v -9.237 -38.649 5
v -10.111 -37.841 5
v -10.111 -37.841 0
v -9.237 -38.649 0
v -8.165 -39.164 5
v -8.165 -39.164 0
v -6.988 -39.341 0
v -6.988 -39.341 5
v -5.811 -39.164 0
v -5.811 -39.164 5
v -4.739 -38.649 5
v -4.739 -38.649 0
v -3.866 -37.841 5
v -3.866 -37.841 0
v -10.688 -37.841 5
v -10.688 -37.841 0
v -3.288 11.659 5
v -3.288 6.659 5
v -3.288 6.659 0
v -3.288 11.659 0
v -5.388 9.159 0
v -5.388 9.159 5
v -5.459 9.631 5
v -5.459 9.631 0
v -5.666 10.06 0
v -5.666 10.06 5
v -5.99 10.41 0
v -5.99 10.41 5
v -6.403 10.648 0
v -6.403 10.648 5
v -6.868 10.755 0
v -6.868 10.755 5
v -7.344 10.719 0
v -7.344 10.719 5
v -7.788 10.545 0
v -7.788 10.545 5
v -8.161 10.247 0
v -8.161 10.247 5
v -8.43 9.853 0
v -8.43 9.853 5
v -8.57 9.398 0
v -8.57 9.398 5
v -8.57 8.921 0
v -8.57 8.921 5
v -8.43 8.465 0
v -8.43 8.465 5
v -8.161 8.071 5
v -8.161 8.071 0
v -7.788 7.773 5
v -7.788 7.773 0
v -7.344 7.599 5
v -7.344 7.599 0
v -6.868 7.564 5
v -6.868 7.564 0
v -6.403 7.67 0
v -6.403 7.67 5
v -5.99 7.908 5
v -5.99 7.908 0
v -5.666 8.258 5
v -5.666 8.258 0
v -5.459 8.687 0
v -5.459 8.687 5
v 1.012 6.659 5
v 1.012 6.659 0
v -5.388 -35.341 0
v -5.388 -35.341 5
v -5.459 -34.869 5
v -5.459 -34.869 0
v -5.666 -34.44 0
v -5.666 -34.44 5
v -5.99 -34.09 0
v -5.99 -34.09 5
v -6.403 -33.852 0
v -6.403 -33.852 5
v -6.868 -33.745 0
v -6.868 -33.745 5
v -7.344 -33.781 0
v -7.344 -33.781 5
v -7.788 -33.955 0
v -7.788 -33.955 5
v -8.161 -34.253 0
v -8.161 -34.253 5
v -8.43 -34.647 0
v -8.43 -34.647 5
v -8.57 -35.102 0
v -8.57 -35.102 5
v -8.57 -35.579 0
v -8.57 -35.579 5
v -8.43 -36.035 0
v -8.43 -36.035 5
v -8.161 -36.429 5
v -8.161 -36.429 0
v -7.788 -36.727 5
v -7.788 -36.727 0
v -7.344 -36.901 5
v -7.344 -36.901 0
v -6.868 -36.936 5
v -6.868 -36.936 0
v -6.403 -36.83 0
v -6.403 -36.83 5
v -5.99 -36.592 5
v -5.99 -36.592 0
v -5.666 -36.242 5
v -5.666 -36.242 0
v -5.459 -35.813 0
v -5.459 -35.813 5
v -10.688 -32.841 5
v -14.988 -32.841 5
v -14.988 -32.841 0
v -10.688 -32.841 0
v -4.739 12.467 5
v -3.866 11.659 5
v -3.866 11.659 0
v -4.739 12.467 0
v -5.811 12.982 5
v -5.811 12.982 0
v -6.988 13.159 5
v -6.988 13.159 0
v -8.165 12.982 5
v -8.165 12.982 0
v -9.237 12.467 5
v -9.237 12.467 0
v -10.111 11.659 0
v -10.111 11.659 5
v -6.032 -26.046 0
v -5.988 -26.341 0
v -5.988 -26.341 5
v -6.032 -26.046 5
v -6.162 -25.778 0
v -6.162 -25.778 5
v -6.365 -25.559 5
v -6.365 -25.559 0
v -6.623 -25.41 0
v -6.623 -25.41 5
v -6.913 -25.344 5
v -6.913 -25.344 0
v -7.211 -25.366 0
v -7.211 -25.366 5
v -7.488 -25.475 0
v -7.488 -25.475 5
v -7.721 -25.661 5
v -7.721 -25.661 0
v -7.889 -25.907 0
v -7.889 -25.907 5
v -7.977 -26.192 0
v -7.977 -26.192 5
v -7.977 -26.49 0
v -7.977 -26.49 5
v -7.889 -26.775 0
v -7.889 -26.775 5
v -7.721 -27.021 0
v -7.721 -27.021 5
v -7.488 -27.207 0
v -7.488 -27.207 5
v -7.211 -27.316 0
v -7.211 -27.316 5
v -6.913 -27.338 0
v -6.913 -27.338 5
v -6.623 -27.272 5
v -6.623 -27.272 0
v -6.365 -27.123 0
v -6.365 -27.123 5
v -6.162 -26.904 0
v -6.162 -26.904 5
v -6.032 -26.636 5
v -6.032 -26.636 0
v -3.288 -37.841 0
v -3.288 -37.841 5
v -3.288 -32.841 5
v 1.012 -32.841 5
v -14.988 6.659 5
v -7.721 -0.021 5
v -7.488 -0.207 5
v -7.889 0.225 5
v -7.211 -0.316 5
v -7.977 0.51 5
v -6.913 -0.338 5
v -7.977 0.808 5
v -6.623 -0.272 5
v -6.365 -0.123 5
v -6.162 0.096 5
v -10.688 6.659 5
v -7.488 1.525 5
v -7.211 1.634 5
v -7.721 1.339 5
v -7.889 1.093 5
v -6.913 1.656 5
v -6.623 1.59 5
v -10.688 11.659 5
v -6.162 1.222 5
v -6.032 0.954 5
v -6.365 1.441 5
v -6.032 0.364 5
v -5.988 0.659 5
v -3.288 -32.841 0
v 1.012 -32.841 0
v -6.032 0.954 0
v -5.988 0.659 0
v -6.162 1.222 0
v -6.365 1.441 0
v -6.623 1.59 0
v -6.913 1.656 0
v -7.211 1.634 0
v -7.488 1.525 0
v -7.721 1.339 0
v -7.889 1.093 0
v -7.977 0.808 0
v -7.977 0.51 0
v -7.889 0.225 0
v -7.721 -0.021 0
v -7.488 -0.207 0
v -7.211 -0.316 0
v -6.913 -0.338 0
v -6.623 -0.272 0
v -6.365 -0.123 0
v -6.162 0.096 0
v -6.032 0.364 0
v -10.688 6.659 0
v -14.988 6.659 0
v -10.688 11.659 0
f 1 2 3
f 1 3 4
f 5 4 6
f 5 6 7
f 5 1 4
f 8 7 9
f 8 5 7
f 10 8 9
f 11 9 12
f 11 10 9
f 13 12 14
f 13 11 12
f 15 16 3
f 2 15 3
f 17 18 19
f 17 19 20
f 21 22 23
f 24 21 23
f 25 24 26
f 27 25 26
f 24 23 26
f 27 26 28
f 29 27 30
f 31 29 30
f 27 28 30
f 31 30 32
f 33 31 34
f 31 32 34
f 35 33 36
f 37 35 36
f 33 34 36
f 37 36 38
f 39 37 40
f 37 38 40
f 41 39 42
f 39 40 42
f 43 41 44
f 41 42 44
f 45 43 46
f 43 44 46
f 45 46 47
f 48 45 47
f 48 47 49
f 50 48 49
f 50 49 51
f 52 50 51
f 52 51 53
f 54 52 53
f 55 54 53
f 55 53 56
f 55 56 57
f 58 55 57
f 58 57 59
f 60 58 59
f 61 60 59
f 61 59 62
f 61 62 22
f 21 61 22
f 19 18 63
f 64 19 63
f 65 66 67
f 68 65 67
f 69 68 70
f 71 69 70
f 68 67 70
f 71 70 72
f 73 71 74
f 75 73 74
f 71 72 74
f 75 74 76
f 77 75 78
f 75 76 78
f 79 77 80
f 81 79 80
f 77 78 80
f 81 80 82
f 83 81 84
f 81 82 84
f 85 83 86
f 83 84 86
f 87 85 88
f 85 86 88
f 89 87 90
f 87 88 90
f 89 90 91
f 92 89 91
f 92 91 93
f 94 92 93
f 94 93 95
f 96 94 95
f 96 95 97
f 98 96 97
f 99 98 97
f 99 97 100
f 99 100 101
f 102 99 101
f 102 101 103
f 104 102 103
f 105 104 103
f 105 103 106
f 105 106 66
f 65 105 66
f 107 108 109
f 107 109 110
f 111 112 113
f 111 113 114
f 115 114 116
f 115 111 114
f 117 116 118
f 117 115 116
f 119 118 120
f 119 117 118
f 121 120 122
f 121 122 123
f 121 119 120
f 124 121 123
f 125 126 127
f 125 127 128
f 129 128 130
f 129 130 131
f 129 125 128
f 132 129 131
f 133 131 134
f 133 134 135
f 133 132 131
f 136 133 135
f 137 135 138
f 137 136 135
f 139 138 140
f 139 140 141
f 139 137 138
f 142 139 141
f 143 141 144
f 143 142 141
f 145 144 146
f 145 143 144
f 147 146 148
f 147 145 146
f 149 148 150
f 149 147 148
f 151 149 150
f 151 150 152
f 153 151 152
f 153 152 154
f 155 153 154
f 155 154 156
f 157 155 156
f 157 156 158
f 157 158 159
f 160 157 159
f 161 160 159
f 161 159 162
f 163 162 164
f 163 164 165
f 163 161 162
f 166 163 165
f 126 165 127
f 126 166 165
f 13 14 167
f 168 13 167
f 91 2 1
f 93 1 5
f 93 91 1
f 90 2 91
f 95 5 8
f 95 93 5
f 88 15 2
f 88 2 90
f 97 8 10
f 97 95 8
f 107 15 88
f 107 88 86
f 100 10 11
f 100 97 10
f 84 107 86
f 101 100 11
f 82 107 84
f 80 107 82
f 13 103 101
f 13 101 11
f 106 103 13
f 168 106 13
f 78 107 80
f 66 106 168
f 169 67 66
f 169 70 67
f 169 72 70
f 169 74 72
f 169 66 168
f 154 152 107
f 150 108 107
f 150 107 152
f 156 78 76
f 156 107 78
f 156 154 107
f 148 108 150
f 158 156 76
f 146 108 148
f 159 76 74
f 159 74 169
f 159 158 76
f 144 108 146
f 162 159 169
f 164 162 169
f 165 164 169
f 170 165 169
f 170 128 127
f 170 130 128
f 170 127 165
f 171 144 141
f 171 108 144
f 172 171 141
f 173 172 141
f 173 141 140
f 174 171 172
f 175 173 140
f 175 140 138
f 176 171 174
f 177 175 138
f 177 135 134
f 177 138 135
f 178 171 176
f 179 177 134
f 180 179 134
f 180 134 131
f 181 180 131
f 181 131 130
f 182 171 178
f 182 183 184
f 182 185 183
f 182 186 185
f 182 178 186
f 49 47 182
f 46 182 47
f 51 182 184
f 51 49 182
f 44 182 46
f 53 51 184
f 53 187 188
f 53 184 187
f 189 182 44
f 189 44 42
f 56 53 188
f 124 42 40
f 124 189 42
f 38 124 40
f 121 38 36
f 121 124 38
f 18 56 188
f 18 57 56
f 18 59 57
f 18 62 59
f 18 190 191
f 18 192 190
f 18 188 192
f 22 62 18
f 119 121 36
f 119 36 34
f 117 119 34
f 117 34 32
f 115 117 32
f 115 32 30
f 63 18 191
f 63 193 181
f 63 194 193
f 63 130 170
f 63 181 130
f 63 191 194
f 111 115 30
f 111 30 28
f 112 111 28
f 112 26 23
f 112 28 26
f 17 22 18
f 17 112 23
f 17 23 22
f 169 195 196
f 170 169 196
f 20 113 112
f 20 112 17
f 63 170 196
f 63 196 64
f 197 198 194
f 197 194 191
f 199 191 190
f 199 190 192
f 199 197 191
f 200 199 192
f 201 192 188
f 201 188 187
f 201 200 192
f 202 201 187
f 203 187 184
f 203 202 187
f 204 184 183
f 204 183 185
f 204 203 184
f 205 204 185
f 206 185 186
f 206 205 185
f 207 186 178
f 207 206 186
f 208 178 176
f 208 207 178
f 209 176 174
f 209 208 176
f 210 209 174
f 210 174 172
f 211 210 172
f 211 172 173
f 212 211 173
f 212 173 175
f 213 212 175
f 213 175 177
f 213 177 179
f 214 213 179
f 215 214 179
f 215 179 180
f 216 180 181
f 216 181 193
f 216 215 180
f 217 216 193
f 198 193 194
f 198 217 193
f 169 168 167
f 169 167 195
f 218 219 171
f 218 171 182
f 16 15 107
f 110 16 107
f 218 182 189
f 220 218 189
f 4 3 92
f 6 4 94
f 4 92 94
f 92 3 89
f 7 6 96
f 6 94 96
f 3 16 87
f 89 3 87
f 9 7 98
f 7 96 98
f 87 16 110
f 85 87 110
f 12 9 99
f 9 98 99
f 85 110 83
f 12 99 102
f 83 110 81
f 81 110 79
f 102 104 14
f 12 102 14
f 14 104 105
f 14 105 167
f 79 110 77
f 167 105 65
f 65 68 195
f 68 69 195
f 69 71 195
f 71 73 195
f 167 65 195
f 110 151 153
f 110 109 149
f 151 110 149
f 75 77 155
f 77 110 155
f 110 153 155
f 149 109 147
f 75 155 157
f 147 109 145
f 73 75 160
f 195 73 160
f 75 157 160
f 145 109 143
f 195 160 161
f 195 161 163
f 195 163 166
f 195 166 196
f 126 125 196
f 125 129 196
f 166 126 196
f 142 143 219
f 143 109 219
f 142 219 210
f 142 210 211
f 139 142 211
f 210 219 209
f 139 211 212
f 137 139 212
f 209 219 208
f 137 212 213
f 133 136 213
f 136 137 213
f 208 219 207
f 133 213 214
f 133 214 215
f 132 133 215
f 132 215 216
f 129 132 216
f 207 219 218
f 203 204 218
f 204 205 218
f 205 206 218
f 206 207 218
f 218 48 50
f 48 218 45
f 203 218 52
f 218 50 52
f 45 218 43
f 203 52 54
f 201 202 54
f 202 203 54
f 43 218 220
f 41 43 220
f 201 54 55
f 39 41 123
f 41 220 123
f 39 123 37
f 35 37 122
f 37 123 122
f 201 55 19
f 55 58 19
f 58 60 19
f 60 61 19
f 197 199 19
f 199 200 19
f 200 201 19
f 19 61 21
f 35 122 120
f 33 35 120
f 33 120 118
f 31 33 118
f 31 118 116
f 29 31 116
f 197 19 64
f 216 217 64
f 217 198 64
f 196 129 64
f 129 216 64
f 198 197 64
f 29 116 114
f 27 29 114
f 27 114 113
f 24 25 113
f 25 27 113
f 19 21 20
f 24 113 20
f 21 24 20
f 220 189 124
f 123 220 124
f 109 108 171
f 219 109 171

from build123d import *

# Parameters (mm, degrees)
ESQUISSE1_W         = 22
ESQUISSE1_H         = 55.5
ESQUISSE1_R         = 1
ESQUISSE1_W_2       = 5
ESQUISSE1_H_2       = 5
BOSS_EXTRU_1_DEPTH  = 5
SKETCH1_W           = 22
SKETCH1_H           = 55.5
SKETCH1_W_2         = 16
SKETCH1_H_2         = 49.5
CUT_EXTRUDE1_DEPTH  = 10
SKETCH2_W           = 1
SKETCH2_H           = 5
BOSS_EXTRUDE1_DEPTH = 5
SKETCH3_R           = 1.6
CUT_EXTRUDE2_DEPTH  = 10
SKETCH4_R           = 4
SKETCH4_R_2         = 1.6
BOSS_EXTRUDE2_DEPTH = 5
SKETCH5_W           = 0.3
SKETCH5_H           = 5
CUT_EXTRUDE3_DEPTH  = 10


with BuildPart() as part:
    # Esquisse1 → Boss.-Extru.1 (new body)
    with BuildSketch(Plane.XY):
        with Locations((-6.988022113, -13.090909091)):
            Rectangle(ESQUISSE1_W, ESQUISSE1_H)
        with Locations((-6.988022113, 0.659090909)):
            Circle(ESQUISSE1_R, mode=Mode.SUBTRACT)
        with Locations((-6.988022113, -26.340909091)):
            Circle(ESQUISSE1_R, mode=Mode.SUBTRACT)
        with Locations((-12.488022113, -35.340909091)):
            Rectangle(ESQUISSE1_W_2, ESQUISSE1_H_2, mode=Mode.SUBTRACT)
        with Locations((-1.488022113, 9.159090909)):
            Rectangle(ESQUISSE1_W_2, ESQUISSE1_H_2, mode=Mode.SUBTRACT)
        with Locations((-1.488022113, -35.340909091)):
            Rectangle(ESQUISSE1_W_2, ESQUISSE1_H_2, mode=Mode.SUBTRACT)
        with Locations((-12.488022113, 9.159090909)):
            Rectangle(ESQUISSE1_W_2, ESQUISSE1_H_2, mode=Mode.SUBTRACT)
    extrude(amount=BOSS_EXTRU_1_DEPTH)

    # Sketch1 → Cut-Extrude1 (cut)
    with BuildSketch(Plane.XY.offset(5)):
        with Locations((-6.988022113, -13.090909091)):
            Rectangle(SKETCH1_W, SKETCH1_H)
        with Locations((-6.988022113, -13.090909091)):
            Rectangle(SKETCH1_W_2, SKETCH1_H_2, mode=Mode.SUBTRACT)
    extrude(amount=-CUT_EXTRUDE1_DEPTH, mode=Mode.SUBTRACT)

    # Sketch2 → Boss-Extrude1 (add)
    with BuildSketch(Plane.XY.offset(5)):
        with Locations((-3.488022113, -35.340909091)):
            Rectangle(SKETCH2_W, SKETCH2_H)
        with Locations((-10.488022113, -35.340909091)):
            Rectangle(SKETCH2_W, SKETCH2_H)
        with Locations((-3.488022113, 9.159090909)):
            Rectangle(SKETCH2_W, SKETCH2_H)
        with Locations((-10.488022113, 9.159090909)):
            Rectangle(SKETCH2_W, SKETCH2_H)
    extrude(amount=-BOSS_EXTRUDE1_DEPTH)

    # Sketch3 → Cut-Extrude2 (cut)
    with BuildSketch(Plane.XY.offset(5)):
        with Locations((-6.988022113, -35.340909091)):
            Circle(SKETCH3_R)
        with Locations((-6.988022113, 9.159090909)):
            Circle(SKETCH3_R)
    extrude(amount=-CUT_EXTRUDE2_DEPTH, mode=Mode.SUBTRACT)

    # Sketch4 → Boss-Extrude2 (add)
    with BuildSketch(Plane.XY.offset(5)):
        with Locations((-6.988022113, -35.340909091)):
            Circle(SKETCH4_R)
        with Locations((-6.988022113, -35.340909091)):
            Circle(SKETCH4_R_2, mode=Mode.SUBTRACT)
        with Locations((-6.988022113, 9.159090909)):
            Circle(SKETCH4_R)
        with Locations((-6.988022113, 9.159090909)):
            Circle(SKETCH4_R_2, mode=Mode.SUBTRACT)
    extrude(amount=-BOSS_EXTRUDE2_DEPTH)

    # Sketch5 → Cut-Extrude3 (cut)
    with BuildSketch(Plane.XY.offset(5)):
        with Locations((-3.138022113, -35.340909091)):
            Rectangle(SKETCH5_W, SKETCH5_H)
        with Locations((-10.838022113, -35.340909091)):
            Rectangle(SKETCH5_W, SKETCH5_H)
        with Locations((-3.138022113, 9.159090909)):
            Rectangle(SKETCH5_W, SKETCH5_H)
        with Locations((-10.838022113, 9.159090909)):
            Rectangle(SKETCH5_W, SKETCH5_H)
    extrude(amount=-CUT_EXTRUDE3_DEPTH, mode=Mode.SUBTRACT)


solid = part.part
